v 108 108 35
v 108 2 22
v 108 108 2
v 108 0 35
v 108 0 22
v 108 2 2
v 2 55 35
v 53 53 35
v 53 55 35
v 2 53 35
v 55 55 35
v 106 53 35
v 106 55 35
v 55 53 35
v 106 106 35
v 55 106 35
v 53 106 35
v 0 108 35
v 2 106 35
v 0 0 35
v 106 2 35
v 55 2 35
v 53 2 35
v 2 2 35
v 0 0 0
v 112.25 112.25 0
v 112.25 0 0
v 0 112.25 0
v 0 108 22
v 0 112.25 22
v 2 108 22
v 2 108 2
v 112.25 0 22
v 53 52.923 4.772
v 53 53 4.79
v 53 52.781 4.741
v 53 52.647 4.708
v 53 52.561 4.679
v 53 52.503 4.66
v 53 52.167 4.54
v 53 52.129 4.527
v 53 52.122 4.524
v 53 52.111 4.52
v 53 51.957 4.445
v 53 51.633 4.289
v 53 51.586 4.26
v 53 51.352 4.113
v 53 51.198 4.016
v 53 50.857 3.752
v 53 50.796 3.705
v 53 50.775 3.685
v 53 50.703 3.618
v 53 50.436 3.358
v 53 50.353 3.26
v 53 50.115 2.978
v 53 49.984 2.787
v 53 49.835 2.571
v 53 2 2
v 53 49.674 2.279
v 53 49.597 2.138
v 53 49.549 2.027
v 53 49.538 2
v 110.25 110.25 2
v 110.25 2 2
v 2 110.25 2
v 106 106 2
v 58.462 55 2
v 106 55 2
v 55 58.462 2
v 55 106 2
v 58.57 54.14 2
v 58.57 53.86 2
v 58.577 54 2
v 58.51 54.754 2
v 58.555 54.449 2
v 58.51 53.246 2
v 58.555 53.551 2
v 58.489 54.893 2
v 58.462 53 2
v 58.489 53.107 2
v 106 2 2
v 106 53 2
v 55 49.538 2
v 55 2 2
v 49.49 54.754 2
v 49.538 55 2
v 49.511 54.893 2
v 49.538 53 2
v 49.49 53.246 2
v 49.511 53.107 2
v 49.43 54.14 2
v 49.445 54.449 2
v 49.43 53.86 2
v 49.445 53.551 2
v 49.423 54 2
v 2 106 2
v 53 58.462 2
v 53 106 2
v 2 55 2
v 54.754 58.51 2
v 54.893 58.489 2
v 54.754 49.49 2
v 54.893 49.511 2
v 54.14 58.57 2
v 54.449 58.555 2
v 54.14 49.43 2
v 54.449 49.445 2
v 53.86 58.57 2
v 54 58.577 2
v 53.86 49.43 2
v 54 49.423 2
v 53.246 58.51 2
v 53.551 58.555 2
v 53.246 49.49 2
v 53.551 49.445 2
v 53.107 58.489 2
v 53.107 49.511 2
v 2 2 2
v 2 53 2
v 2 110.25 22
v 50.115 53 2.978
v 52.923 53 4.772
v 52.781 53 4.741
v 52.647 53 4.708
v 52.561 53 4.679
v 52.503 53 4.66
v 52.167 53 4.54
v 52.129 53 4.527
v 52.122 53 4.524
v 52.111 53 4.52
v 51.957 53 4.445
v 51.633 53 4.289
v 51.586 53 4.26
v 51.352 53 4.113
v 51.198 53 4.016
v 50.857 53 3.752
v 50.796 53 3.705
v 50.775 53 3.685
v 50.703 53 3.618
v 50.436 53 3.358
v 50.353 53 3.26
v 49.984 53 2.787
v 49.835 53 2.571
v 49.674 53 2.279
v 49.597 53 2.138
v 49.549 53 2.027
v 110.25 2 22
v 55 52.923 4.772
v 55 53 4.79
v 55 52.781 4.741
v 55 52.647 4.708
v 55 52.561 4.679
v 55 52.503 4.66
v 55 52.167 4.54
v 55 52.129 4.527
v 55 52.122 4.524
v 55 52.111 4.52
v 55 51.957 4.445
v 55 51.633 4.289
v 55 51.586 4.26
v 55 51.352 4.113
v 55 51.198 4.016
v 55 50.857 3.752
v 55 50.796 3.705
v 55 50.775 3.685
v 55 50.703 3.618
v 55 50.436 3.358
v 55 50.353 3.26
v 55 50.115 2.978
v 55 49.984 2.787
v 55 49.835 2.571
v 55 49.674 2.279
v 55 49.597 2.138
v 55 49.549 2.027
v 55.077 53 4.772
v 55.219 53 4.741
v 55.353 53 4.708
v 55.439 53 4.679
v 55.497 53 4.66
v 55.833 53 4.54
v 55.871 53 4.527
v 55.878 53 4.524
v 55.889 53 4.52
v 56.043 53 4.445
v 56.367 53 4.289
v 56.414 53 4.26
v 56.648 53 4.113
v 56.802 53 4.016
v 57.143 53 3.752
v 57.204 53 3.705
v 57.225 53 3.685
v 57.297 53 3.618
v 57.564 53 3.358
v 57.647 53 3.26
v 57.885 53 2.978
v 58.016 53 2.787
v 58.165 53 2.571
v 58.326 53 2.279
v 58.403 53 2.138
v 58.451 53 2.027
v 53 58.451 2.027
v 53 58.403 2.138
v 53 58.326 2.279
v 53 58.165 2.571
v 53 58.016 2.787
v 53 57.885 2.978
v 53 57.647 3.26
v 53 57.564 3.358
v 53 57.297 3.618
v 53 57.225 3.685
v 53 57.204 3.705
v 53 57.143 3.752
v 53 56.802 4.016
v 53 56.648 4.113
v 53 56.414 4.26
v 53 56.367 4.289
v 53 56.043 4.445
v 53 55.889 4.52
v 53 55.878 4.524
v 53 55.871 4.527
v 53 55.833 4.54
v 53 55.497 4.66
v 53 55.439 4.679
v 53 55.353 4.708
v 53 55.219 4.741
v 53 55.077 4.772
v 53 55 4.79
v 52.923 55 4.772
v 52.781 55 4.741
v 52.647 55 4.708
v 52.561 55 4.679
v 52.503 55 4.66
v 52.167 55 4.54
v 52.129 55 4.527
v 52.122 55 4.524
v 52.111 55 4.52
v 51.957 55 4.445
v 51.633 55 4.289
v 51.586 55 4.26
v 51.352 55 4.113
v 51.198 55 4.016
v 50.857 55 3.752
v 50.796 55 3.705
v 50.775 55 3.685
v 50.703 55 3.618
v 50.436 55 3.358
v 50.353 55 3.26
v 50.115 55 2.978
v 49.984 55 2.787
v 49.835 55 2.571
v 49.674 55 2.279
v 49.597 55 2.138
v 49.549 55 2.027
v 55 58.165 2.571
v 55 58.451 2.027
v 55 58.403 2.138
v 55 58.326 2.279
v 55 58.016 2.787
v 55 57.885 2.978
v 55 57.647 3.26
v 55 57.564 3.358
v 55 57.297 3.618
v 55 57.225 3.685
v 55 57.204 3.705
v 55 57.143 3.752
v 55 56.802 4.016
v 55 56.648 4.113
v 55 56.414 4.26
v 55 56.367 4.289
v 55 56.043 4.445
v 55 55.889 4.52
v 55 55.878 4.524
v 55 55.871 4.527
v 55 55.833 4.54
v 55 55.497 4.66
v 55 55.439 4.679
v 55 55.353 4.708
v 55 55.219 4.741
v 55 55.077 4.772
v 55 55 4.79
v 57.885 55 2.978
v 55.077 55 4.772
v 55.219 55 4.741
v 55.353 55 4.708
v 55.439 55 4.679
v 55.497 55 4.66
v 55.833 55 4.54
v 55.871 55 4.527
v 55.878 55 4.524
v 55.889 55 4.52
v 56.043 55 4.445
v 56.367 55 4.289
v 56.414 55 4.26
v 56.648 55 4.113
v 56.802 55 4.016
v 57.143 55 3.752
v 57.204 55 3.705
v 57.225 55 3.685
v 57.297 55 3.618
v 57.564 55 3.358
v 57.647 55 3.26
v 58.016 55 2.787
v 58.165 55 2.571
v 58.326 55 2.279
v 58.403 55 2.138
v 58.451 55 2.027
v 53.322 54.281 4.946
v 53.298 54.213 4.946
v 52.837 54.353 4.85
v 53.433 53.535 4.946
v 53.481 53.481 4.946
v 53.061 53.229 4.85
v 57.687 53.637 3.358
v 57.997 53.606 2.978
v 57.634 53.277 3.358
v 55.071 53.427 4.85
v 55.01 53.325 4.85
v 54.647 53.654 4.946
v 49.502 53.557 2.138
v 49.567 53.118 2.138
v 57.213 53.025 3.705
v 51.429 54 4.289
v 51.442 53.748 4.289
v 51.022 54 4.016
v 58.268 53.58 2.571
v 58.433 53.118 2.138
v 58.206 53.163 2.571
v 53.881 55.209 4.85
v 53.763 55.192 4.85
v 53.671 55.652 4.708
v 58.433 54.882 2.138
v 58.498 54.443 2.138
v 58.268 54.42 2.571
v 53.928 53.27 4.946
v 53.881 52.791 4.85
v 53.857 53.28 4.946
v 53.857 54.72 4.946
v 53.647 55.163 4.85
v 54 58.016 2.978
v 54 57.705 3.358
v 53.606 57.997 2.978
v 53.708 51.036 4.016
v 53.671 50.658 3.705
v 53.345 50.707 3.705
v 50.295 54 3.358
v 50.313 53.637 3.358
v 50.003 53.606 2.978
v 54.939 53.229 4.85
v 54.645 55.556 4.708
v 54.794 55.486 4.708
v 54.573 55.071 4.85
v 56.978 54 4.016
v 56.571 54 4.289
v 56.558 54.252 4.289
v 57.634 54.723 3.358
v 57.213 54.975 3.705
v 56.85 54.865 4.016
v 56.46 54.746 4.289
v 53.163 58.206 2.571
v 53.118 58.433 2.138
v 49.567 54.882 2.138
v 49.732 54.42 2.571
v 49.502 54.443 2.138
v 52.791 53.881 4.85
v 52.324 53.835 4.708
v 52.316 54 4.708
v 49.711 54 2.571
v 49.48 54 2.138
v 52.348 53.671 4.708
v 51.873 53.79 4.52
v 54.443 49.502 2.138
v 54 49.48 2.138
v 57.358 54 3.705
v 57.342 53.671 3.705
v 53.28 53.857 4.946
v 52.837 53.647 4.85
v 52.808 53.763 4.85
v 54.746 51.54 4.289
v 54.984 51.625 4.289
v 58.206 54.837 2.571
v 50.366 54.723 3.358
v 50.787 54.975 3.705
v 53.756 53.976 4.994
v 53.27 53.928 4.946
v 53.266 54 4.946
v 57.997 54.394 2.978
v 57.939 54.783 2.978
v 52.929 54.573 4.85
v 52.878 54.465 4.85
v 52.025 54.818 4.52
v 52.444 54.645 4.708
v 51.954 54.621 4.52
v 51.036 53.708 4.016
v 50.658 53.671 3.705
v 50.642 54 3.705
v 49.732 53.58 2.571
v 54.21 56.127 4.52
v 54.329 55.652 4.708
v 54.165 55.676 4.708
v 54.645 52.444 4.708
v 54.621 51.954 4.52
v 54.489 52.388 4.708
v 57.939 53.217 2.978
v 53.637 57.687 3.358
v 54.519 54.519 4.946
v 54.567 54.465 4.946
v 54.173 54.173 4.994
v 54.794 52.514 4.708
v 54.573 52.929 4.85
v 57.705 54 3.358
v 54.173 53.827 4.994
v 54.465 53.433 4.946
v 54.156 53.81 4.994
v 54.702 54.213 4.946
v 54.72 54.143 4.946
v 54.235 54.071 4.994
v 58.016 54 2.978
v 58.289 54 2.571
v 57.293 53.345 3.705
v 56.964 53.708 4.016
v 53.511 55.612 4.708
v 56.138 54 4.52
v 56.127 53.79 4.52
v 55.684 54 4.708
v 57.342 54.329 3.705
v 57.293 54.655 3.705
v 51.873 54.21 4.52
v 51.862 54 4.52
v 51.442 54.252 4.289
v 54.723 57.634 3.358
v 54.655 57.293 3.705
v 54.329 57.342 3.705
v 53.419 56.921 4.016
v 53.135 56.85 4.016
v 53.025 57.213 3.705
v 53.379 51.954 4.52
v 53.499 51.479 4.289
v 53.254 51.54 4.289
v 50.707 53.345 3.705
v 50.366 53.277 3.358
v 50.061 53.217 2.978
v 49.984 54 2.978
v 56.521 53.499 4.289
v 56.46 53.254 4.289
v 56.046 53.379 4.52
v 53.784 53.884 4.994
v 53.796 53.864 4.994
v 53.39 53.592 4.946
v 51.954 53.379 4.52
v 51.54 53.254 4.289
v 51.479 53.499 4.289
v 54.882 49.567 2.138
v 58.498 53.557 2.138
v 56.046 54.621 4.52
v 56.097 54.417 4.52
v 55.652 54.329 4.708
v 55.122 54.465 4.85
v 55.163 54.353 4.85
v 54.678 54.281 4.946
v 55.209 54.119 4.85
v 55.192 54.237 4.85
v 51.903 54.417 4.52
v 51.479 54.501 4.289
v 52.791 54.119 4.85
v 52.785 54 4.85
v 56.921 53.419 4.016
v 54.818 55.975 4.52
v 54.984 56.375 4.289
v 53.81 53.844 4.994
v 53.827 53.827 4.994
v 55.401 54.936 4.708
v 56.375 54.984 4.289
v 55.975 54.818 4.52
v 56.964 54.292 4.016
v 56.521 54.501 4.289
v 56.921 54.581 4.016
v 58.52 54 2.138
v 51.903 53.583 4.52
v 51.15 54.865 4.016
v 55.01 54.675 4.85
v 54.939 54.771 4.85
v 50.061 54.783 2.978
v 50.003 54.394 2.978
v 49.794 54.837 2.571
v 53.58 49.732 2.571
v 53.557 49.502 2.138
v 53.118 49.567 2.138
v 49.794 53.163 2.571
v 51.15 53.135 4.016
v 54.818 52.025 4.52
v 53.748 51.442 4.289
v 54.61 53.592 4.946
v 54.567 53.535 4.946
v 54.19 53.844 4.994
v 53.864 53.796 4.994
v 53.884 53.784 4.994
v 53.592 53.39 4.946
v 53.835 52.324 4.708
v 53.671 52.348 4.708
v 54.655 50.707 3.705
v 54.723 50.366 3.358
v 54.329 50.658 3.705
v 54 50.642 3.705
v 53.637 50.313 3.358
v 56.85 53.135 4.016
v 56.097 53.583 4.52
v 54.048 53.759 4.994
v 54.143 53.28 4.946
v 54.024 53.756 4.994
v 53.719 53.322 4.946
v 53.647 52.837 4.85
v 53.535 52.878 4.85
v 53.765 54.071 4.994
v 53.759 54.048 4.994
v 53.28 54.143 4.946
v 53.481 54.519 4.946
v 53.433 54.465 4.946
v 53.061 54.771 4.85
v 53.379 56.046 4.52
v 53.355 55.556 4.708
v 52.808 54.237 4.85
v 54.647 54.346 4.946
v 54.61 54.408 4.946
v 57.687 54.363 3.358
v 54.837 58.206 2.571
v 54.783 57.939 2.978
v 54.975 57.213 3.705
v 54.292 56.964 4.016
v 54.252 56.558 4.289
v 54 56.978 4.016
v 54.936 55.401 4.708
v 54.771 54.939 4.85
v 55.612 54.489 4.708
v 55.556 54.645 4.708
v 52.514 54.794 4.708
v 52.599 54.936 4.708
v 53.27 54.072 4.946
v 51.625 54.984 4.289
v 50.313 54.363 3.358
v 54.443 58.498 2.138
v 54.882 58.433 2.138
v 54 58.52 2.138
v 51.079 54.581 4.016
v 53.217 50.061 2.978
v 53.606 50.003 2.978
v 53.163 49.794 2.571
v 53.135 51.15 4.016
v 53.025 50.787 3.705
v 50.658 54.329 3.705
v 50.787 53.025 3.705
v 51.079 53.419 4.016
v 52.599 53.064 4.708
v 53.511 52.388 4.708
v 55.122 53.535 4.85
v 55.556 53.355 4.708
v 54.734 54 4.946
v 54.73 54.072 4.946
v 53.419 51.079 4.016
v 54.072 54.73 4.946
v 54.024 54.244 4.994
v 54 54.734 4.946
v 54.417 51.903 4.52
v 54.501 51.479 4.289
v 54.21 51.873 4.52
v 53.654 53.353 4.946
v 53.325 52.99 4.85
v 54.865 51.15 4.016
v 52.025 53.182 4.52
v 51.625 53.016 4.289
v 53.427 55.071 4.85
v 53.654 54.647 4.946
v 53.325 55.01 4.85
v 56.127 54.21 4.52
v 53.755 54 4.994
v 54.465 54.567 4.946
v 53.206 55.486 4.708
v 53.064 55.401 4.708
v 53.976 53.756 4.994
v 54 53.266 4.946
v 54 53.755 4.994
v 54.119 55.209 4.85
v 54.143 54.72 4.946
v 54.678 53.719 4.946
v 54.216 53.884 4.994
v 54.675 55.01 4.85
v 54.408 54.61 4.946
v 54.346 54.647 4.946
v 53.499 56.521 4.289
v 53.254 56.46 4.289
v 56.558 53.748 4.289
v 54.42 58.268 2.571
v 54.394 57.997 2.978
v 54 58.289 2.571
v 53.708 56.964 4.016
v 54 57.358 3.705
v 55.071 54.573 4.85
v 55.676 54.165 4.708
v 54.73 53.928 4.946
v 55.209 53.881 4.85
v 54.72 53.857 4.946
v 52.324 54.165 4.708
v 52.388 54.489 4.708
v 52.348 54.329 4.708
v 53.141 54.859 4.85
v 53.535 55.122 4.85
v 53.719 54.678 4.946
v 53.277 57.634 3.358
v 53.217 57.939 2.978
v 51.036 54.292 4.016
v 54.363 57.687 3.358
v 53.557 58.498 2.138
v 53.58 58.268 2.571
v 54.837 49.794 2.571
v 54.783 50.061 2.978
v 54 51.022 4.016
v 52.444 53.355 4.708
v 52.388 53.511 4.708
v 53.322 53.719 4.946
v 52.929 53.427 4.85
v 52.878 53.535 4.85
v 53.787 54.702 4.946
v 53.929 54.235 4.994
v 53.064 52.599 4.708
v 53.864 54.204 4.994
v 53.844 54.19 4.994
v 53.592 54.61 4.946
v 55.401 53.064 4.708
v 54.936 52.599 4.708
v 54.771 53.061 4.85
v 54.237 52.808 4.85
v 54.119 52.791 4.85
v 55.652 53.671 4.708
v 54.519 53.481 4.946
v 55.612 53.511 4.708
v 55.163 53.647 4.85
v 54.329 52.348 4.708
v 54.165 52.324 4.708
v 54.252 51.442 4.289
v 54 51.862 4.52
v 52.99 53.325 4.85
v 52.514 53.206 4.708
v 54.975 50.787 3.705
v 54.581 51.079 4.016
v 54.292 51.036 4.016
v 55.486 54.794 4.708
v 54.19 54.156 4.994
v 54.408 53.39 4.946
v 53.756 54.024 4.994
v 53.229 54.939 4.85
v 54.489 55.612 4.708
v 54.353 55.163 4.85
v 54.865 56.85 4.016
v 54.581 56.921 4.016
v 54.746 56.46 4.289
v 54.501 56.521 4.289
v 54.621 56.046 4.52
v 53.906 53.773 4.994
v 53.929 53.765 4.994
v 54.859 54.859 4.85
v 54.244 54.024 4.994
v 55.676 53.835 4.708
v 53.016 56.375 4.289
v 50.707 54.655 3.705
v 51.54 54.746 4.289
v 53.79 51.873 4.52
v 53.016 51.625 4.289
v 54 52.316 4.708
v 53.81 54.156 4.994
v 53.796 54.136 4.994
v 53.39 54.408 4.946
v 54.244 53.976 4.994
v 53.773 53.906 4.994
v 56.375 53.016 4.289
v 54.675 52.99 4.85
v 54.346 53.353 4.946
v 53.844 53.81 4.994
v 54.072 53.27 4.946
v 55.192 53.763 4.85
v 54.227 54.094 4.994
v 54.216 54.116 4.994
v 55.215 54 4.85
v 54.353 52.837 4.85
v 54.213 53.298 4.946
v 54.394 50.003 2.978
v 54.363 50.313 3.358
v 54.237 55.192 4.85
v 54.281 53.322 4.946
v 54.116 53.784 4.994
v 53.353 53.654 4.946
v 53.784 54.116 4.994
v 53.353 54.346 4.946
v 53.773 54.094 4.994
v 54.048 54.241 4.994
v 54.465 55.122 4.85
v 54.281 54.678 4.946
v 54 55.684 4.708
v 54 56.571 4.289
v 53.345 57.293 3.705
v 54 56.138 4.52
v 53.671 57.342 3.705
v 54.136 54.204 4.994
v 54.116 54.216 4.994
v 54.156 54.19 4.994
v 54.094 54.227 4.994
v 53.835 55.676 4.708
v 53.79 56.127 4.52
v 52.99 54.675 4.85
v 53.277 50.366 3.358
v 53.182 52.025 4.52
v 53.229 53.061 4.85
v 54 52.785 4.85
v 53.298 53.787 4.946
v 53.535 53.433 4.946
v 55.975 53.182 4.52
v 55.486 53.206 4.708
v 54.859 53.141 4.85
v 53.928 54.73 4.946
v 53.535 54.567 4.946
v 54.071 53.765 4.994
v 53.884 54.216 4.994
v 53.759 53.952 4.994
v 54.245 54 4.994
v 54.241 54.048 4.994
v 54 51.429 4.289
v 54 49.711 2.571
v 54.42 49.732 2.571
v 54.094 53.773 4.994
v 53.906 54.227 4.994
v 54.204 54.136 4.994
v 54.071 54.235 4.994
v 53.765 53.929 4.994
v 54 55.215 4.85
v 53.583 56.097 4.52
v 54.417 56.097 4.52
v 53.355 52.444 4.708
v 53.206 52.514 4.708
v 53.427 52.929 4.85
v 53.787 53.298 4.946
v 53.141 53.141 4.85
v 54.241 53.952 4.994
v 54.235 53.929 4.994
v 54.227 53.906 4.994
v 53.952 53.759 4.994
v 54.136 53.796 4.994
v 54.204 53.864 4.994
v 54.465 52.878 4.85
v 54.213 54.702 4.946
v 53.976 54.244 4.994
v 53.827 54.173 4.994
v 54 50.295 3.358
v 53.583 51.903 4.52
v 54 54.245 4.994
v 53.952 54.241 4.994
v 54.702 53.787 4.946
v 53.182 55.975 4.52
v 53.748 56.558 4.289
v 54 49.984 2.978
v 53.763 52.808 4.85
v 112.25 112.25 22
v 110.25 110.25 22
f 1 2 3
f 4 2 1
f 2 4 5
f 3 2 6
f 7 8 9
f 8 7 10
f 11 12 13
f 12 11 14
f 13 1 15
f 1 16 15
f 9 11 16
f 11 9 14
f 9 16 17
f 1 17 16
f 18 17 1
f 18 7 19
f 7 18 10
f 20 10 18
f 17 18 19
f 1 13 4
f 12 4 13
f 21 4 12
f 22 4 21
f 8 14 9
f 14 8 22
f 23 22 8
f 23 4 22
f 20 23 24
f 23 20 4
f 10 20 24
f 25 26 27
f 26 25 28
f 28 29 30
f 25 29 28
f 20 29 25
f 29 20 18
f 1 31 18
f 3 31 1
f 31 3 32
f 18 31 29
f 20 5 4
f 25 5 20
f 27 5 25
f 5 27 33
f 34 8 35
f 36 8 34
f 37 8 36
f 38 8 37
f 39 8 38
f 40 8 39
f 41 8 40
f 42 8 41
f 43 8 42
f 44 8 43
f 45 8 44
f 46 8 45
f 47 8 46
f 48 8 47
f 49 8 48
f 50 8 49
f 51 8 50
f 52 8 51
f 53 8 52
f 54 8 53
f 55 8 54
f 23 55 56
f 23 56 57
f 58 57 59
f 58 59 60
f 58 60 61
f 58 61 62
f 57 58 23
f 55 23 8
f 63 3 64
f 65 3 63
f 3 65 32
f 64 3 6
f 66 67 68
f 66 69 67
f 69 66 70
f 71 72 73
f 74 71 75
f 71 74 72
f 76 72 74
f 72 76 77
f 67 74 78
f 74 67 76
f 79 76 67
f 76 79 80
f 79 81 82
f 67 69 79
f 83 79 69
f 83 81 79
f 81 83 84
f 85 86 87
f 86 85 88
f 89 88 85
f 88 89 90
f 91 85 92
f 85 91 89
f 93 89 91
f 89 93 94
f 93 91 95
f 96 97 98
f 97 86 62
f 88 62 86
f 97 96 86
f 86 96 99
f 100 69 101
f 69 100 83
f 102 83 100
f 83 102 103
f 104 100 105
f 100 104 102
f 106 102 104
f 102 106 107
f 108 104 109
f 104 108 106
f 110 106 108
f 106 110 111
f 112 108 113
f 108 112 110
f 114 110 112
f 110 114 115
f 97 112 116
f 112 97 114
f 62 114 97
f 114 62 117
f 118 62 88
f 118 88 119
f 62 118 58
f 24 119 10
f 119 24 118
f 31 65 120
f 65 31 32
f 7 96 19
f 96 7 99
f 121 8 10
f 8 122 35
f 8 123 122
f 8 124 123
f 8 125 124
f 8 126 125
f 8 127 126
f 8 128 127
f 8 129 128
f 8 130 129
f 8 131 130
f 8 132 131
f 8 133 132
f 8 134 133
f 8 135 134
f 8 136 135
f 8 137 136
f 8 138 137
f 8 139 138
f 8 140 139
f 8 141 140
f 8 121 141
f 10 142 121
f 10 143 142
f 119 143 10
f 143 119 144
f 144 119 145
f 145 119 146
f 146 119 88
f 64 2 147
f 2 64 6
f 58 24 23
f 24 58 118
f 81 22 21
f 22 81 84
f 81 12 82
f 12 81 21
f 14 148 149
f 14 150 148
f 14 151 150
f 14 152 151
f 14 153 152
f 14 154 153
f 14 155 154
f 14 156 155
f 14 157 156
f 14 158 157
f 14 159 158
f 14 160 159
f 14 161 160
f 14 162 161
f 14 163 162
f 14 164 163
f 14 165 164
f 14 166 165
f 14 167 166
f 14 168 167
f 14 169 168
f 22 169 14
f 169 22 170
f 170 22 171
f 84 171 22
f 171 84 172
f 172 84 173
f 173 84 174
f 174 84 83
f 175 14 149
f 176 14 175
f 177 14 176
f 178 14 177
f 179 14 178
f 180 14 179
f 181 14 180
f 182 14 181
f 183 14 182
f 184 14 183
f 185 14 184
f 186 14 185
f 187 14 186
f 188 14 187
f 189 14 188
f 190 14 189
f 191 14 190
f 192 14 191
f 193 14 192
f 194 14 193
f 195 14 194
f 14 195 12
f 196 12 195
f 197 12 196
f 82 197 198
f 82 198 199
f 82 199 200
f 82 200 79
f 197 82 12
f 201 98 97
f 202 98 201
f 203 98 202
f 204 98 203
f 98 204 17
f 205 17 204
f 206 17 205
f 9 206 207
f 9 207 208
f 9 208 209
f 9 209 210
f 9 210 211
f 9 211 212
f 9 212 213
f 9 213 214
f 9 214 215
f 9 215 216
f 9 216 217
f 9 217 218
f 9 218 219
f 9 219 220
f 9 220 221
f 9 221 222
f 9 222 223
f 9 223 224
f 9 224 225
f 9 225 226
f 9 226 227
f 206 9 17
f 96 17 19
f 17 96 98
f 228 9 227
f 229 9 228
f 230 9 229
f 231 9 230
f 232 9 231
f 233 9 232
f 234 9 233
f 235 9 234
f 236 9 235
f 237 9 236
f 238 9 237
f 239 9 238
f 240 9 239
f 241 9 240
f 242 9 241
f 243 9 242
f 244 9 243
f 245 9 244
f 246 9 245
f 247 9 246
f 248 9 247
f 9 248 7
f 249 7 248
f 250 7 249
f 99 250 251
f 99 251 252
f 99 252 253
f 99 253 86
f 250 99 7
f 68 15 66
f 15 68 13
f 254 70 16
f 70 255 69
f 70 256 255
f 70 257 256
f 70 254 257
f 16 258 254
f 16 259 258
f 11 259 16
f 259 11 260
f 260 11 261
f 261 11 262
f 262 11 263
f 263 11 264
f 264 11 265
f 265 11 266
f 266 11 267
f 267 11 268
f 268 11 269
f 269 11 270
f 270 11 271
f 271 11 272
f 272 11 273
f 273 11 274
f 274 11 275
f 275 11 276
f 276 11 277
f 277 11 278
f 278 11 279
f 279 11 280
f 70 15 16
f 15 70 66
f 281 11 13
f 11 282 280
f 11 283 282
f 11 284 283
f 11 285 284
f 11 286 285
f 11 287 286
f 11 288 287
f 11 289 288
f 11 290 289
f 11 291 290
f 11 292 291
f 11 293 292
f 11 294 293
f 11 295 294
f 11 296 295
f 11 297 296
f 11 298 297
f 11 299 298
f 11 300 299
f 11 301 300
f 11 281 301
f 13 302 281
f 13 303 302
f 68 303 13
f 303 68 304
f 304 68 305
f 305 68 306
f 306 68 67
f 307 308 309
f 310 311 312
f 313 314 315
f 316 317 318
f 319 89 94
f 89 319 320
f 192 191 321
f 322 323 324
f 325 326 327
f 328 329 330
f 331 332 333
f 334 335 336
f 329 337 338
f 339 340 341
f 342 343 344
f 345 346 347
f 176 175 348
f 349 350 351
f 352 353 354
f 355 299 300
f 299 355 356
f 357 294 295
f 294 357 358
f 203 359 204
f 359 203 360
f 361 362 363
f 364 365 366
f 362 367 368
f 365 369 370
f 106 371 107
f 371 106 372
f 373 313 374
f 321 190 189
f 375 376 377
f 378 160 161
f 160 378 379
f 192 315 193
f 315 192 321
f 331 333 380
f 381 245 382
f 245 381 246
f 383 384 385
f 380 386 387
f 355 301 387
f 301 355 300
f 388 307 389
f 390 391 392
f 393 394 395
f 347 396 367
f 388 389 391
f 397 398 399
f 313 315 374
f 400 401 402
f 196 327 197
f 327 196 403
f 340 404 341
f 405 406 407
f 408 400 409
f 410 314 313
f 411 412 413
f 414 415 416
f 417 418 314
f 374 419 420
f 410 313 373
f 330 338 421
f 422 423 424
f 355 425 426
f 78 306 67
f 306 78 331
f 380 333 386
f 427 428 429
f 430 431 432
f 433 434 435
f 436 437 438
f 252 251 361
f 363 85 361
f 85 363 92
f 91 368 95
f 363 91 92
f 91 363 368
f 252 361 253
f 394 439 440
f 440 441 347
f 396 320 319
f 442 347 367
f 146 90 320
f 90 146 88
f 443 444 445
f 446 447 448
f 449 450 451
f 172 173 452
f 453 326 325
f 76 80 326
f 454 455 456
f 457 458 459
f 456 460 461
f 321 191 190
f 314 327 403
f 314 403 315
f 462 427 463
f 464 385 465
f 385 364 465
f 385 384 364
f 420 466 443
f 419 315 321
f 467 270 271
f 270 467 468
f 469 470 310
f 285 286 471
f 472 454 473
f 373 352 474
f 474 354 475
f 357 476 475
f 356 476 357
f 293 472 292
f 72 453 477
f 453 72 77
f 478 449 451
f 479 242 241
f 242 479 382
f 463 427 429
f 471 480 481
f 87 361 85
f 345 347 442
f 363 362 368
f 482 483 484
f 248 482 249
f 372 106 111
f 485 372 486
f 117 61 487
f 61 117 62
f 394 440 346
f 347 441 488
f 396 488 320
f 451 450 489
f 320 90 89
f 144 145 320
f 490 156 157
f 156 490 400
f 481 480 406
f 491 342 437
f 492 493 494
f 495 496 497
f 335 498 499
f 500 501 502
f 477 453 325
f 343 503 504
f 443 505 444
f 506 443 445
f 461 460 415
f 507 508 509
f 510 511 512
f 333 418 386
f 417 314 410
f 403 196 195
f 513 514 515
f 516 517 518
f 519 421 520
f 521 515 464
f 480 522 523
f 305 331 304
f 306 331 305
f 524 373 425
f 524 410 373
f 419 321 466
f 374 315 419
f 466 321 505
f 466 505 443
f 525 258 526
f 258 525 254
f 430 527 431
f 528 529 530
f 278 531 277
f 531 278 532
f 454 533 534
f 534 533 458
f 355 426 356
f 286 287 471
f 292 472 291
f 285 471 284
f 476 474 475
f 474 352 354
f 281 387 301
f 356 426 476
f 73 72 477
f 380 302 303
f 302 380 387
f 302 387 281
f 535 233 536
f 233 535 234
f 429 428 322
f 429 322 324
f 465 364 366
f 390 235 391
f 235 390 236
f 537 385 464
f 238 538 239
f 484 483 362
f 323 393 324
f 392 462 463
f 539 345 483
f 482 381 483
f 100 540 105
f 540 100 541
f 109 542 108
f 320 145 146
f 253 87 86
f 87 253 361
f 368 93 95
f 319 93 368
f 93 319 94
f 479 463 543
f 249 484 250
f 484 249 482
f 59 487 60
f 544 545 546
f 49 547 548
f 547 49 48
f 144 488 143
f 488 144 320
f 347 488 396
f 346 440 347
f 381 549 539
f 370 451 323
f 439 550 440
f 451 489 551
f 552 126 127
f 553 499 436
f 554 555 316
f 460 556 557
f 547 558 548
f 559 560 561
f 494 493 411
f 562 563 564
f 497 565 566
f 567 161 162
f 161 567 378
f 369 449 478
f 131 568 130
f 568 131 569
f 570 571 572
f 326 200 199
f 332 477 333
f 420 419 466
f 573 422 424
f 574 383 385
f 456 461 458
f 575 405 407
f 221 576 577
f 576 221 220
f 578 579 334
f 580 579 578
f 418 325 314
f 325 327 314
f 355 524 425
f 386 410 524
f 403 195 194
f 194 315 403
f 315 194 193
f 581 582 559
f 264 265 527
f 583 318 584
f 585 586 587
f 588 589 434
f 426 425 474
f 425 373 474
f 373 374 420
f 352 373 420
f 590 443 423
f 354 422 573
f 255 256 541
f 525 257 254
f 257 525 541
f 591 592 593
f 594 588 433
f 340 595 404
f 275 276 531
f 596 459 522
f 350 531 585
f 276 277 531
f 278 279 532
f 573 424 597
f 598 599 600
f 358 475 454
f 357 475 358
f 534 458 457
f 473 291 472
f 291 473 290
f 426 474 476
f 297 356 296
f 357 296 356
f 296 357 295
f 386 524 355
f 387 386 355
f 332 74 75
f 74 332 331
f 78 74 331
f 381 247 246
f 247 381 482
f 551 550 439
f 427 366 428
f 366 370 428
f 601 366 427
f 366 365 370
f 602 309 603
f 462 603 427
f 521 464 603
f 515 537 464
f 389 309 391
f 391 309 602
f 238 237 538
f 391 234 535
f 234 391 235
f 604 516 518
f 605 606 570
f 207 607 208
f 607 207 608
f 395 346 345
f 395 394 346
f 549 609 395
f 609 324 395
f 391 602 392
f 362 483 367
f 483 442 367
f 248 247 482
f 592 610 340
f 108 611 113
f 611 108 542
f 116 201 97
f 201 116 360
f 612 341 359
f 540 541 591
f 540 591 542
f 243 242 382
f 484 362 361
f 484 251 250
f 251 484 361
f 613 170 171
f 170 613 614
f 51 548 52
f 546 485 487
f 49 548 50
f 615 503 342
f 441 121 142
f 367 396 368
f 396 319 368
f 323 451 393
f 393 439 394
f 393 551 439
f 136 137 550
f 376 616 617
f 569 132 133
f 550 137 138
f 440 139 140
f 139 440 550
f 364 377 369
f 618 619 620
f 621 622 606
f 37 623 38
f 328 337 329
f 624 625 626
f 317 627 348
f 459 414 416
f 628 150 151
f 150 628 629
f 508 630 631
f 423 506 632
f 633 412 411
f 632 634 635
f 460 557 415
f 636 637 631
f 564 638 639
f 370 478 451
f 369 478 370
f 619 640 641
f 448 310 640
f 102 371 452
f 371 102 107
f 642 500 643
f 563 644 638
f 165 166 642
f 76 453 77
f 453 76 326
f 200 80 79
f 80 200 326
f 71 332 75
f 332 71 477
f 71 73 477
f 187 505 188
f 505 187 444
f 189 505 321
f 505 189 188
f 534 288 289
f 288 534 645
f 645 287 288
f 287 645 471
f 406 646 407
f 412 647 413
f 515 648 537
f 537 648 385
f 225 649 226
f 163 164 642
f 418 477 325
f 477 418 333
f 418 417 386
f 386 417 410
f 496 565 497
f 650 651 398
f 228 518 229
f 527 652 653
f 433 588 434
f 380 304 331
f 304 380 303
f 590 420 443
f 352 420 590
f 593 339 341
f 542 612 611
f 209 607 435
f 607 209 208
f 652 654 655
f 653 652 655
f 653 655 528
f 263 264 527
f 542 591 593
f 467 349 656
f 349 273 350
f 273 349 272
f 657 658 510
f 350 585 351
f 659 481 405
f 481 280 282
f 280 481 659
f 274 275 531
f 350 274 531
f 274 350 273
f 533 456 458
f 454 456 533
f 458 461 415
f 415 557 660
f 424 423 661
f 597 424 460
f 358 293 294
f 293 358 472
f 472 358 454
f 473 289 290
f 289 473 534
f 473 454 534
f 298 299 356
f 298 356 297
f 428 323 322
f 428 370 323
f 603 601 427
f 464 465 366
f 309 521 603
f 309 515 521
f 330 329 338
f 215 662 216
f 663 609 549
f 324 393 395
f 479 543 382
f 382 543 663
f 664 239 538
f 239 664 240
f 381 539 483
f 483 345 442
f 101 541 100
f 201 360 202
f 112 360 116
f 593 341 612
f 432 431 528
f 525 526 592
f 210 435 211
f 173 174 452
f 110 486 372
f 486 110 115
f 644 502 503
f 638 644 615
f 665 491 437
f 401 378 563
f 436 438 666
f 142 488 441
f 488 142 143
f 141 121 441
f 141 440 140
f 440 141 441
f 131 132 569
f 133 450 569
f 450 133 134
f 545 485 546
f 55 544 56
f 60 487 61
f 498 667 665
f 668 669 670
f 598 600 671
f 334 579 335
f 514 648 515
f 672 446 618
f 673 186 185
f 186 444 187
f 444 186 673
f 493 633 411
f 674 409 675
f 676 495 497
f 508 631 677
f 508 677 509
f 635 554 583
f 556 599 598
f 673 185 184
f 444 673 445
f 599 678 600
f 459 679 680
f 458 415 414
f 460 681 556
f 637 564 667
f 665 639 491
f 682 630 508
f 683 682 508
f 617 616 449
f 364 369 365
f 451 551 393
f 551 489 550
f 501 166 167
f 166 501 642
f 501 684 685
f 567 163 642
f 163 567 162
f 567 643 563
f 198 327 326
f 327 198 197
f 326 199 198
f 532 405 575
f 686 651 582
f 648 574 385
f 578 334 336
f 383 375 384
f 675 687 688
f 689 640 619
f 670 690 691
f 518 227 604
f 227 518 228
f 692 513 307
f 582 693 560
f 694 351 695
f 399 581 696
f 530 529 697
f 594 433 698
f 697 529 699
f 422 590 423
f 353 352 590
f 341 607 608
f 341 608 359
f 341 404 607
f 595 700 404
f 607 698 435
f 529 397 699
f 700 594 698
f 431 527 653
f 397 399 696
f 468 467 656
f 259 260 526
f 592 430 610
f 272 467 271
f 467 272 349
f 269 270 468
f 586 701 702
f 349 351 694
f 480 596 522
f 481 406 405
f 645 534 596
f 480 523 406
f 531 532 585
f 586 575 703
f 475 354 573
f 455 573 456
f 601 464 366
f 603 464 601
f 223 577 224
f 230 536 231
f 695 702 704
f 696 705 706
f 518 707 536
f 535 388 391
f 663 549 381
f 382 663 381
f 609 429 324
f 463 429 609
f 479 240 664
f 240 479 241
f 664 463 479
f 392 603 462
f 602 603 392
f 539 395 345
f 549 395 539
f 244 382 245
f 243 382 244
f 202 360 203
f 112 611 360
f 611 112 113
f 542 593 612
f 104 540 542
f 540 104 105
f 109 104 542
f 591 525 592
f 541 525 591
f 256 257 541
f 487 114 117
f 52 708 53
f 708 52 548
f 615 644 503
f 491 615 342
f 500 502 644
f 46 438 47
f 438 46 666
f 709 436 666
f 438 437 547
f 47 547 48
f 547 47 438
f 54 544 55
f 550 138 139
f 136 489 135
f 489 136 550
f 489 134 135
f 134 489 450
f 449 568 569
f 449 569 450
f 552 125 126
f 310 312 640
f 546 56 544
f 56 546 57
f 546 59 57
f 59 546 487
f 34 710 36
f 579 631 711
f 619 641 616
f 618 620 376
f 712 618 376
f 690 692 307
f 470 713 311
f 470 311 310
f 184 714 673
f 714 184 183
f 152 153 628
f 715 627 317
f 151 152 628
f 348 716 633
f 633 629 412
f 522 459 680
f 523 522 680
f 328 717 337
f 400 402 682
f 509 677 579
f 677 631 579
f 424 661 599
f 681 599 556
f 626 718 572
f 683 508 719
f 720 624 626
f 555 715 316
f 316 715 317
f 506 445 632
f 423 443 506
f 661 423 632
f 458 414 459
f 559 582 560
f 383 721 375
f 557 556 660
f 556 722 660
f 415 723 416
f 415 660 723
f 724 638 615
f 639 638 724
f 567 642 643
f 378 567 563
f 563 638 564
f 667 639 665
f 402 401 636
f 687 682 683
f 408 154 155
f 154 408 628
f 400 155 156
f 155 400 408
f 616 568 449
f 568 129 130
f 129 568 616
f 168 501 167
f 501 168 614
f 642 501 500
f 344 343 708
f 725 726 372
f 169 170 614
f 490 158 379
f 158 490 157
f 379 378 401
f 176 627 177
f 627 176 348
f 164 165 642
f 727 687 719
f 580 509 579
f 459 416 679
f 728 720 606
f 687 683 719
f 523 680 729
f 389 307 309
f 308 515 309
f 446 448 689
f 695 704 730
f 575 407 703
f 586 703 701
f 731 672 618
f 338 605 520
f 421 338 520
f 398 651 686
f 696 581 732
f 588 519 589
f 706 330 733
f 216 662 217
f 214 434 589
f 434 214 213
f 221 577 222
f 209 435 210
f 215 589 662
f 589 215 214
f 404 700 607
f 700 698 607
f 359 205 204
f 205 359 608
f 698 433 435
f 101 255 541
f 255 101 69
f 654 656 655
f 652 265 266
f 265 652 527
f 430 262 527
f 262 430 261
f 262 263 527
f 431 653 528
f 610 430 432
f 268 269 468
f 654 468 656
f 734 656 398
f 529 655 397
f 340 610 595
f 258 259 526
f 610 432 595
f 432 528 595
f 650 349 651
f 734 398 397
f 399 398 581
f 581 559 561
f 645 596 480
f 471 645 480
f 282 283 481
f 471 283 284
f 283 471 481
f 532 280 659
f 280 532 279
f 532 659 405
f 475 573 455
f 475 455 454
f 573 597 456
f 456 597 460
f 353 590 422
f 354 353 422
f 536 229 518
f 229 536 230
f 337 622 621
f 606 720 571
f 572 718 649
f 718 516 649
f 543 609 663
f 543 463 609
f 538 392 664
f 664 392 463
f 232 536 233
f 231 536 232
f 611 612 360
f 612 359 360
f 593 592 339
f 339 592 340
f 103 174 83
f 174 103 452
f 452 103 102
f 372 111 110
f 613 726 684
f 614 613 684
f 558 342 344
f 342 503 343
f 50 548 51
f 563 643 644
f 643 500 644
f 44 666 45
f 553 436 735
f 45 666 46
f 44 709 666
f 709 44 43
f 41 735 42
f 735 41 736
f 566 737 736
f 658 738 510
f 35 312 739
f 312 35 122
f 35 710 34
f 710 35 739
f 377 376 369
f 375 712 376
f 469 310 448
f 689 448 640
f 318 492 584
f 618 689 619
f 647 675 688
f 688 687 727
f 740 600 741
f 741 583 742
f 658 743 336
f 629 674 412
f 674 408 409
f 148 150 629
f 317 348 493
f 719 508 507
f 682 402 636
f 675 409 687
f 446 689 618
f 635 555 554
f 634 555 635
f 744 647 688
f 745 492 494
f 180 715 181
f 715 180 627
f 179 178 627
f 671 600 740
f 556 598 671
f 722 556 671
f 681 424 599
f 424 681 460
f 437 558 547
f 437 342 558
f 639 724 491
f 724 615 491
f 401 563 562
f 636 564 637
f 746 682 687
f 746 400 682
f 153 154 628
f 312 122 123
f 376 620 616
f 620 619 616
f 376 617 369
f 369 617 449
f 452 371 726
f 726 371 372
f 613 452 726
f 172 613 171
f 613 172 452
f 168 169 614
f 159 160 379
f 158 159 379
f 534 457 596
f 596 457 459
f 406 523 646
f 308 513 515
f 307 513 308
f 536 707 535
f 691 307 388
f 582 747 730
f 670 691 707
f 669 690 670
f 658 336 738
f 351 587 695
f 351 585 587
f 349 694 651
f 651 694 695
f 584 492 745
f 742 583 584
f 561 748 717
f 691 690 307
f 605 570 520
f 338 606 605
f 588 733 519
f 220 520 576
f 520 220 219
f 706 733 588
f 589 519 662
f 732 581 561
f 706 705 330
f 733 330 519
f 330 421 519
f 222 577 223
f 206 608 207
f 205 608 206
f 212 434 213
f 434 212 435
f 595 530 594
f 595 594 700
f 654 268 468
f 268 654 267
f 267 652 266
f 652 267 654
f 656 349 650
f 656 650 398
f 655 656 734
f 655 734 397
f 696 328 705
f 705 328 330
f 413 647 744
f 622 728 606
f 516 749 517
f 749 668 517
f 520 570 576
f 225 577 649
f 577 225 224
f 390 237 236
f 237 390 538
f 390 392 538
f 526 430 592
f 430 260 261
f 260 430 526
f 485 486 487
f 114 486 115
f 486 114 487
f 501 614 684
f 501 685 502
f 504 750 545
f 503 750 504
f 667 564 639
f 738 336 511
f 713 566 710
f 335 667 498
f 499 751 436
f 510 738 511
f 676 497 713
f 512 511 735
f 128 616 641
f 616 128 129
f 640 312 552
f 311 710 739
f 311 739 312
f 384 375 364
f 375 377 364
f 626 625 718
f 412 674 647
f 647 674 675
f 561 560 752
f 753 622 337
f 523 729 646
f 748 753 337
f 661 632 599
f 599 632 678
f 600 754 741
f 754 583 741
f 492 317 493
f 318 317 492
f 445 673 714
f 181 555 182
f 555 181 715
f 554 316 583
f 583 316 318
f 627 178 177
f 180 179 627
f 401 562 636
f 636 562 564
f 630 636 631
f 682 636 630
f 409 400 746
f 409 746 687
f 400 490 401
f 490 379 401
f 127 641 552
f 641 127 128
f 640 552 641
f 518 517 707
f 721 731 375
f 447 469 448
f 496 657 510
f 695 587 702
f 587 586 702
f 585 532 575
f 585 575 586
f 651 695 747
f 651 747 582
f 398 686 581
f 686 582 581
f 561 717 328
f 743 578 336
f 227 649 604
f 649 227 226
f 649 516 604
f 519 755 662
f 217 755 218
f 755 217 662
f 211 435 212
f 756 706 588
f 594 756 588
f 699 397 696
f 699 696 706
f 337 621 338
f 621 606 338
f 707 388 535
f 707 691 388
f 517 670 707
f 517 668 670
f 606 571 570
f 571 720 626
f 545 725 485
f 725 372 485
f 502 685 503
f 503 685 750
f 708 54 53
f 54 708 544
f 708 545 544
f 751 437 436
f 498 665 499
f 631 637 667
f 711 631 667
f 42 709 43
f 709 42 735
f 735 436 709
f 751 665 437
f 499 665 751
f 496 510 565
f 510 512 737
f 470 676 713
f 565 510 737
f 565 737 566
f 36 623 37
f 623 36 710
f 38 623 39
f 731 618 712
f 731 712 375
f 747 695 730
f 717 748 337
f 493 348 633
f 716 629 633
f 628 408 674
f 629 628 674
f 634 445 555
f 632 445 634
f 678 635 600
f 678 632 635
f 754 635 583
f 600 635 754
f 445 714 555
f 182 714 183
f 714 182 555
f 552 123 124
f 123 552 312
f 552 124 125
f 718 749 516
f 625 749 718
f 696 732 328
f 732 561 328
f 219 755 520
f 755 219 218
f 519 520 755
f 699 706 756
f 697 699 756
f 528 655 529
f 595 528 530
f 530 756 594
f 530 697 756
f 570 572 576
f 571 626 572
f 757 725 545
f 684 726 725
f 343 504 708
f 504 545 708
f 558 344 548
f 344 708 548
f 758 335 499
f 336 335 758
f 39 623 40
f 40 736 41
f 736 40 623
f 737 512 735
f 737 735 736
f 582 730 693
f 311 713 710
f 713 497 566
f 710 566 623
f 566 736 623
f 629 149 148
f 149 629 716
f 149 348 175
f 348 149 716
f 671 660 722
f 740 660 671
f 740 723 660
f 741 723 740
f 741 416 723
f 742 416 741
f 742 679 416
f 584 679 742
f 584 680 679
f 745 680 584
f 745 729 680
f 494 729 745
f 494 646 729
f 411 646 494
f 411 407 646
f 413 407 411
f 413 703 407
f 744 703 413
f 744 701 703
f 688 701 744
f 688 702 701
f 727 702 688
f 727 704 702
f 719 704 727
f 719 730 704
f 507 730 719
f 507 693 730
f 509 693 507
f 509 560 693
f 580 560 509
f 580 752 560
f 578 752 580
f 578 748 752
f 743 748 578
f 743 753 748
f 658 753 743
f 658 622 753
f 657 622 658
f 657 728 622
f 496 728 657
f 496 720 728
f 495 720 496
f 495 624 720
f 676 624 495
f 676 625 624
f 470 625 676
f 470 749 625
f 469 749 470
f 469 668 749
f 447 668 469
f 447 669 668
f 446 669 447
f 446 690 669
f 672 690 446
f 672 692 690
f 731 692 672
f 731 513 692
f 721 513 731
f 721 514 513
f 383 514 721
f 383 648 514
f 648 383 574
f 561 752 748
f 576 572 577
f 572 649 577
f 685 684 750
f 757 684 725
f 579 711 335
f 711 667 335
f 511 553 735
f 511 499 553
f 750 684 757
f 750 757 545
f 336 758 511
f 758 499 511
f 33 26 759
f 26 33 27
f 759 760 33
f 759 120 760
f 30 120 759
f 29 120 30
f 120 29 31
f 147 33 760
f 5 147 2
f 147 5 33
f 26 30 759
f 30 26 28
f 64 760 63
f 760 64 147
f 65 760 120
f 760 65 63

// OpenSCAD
life_token_r = 40/2;
character_token_r = 47/2;
vote_token_r = 25/2;
reminder_token_r = 25/2;
night_token_r = 12/2;
alignment_token_r = 15/2;

shroud_x = 20;
shroud_y = 36;
shroud_notch_y = 8.5;

info_tag_x = 47;
info_tag_y = 58;
info_tag_corner_r = 3.5;
info_tag_offset_x = info_tag_x-info_tag_corner_r*2;
info_tag_offset_y = info_tag_y-info_tag_corner_r*2;

token_z = 1.5;
$fn=64;

// This is a tool for cutting nice circles out of paper for gluing onto the printed tokens.
// Print both parts. Glue a section of craft knife blade to the flat portion of the outer ring.
// Position the thicker inner ring exactly over the centre of the circle you want to cut.
// Lower the outer ring over the inner ring. Firmly hold the inner ring in place as you rotate
// the outer ring around to make the cut.
// Tweak the cutter_gap variable until your outer ring fits snugly over the inner ring with
// minimum wiggle room.

// I've found that it's good to make the circle pieces slightly smaller than the tokens to
// protect the edges of the paper.
cutter_tweak = 0.25;
cutter_inner_z = 30;
cutter_inner_thickness = 5;
cutter_outer_z = 15;
cutter_outer_thickness = 2;
cutter_gap = 0.1; // You may need to change this number based on how much clearance you need.
cutter_blade_thickness = 0.4;
cutter_blade_flat_section_x = 10;
cutter_fn = 100;
cutter_blade_x = 4.8;

module cutter(cut_radius) {
    cutter_inner(cut_radius-cutter_tweak);
    translate([cut_radius*2+10,0,0]) cutter_outer(cut_radius-cutter_tweak);
}

module cutter_inner(cut_radius) {
    difference() {
        cylinder(r=cut_radius-cutter_blade_thickness/2-cutter_outer_thickness-cutter_gap, h=cutter_inner_z, $fn=cutter_fn);
        cylinder(r=cut_radius-cutter_blade_thickness/2-cutter_outer_thickness-cutter_gap-cutter_inner_thickness, h=cutter_inner_z, $fn=cutter_fn);
    }
}

module cutter_blade_groove() {
    wt = (cutter_blade_flat_section_x - cutter_blade_x)/2;
    translate([-wt/2-cutter_blade_x/2,cutter_blade_thickness,cutter_outer_z/2]) cube([wt,cutter_blade_thickness*2,cutter_outer_z], center=true);
    translate([wt/2+cutter_blade_x/2,cutter_blade_thickness,cutter_outer_z/2]) cube([wt,cutter_blade_thickness*2,cutter_outer_z], center=true);
}

module cutter_outer(cut_radius, blade_grooves=false) {
    difference() {
        hull() {
            cylinder(r=cut_radius-cutter_blade_thickness/2, h=cutter_outer_z, $fn=cutter_fn);
            for (i = [0:360/3:360]) {
                rotate([0,0,i]) translate([-cutter_blade_flat_section_x/2,cut_radius-cutter_blade_thickness/2-cutter_outer_thickness,0]) cube([cutter_blade_flat_section_x, cutter_outer_thickness, cutter_outer_z]);
            }
        }
        cylinder(r=cut_radius-cutter_blade_thickness/2-cutter_outer_thickness, h=cutter_outer_z, $fn=cutter_fn);
    }
    if (blade_grooves) {
        for (i = [0:360/3:360]) {
            rotate([0,0,i]) translate([0,cut_radius-cutter_blade_thickness/2,0]) cutter_blade_groove();
        }
    }
}

module token(radius) {
    cylinder(r=radius,h=token_z);
}

module life_token() {
    token(life_token_r);
}

module character_token() {
    token(character_token_r);
}

module vote_token() {
    token(vote_token_r);
}

module reminder_token() {
    token(reminder_token_r);
}

module alignment_token() {
    token(alignment_token_r);
}

module night_token() {
    token(night_token_r);
}

module info_tag() {
    hull() {
        cylinder(r=info_tag_corner_r, h = token_z);
        translate([info_tag_offset_x, info_tag_offset_y, 0]) cylinder(r=info_tag_corner_r, h = token_z);
        translate([0, info_tag_offset_y, 0]) cylinder(r=info_tag_corner_r, h = token_z);
        translate([info_tag_offset_x, 0, 0]) cylinder(r=info_tag_corner_r, h = token_z);
    }
}

module shroud() {
    difference() {
        cube([shroud_x, shroud_y, token_z*2]);
        translate([shroud_x/2,0,0]) scale([shroud_x/2,shroud_notch_y,1]) rotate([0,0,45]) cube([sqrt(2), sqrt(2), 100], center=true);
        translate([shroud_x/2,shroud_y/4,token_z]) character_token();
    }
}


// Bits box
// I originally started out with a design matching the bits boxes that come with the
// proper version of the game, with three square compartments large enough to hold
// the character tokens, and two smaller compartments at the end, all in one row.
// However this was too long to fit onto my print bed, so I went for a 2x2 arrangement
// of uniformly sized compartments.
// I added a hole cutout in the bottom of the bits box base to let air in. I found
// on earlier versions that it was hard to get the lid off due to the partial vacuum
// formed when lifting the lid.
bits_box_wt = 2; // Wall thickness
game_box_inside_x = 257;
bits_box_clearance_x = 5;
// bits_box_x = game_box_inside_x-bits_box_clearance_x;
bits_box_lid_clearance = 0.25;
bits_box_bits_clearance = 0.5; // How much space around the reminder tokens?
// Make the compartments big enough to store four stacks of reminder tokens.
bits_box_compartment_xy = reminder_token_r*4+bits_box_bits_clearance*2;
bits_box_x = 2*bits_box_compartment_xy+bits_box_wt*3;
bits_box_y = bits_box_x;
bits_box_z = 35;
bits_box_lid_z = 20;
bits_box_vent_hole_r = 5; // The lid seals onto the base too well. Needs a breather hole.

module bits_box_base_cutout() {
    cube([bits_box_compartment_xy, bits_box_compartment_xy, bits_box_z-bits_box_wt]);
    // translate([bits_box_compartment_xy/2, bits_box_compartment_xy/2,-bits_box_wt]) cylinder(r=bits_box_vent_hole_r, h = bits_box_wt);
}

module bits_box_base() {
    difference() {
        cube([bits_box_x, bits_box_y, bits_box_z]);
        translate([bits_box_wt,bits_box_wt,bits_box_wt]) bits_box_base_cutout();
        translate([bits_box_wt*2+bits_box_compartment_xy,bits_box_wt,bits_box_wt]) bits_box_base_cutout();
        translate([bits_box_wt,bits_box_wt*2+bits_box_compartment_xy,bits_box_wt]) bits_box_base_cutout();
        translate([bits_box_wt*2+bits_box_compartment_xy,bits_box_wt*2+bits_box_compartment_xy,bits_box_wt]) bits_box_base_cutout();
        translate([bits_box_x/2, bits_box_y/2, 0]) sphere(r=bits_box_vent_hole_r);
    }
}

module bits_box_lid() {
    difference() {
        cube([bits_box_x+bits_box_lid_clearance+2*bits_box_wt, bits_box_y+bits_box_lid_clearance+2*bits_box_wt, bits_box_lid_z+bits_box_wt]);
        translate([bits_box_wt,bits_box_wt,bits_box_wt]) cube([bits_box_x+bits_box_lid_clearance, bits_box_y+bits_box_lid_clearance, bits_box_z]);
    }
}

// This is a clip to hold the two halves of the grimoire box together. Dog clips
// work well enough, but for maximum structural strength the very tops of the side
// edges of the grimoire should be pinched together. The pinch point of normal dog
// clips is some distance from the base of their throat.

clip_z = 25;
clip_length = 50;
clip_wt = 3;
// When tightly squashed the edges of my grimoire, made from a pandemic legacy season 0 box,
// measure 6.05mm in total.
clip_gap = 6.0;

module clip() {
    difference () {
        cube([clip_wt*2+clip_gap, clip_length, clip_z]);
        translate([clip_wt,0,clip_wt]) cube([clip_gap, clip_length, clip_z]);
        translate([0,0,clip_z]) rotate([0,45,0]) cube([(clip_wt*2+clip_gap)/sqrt(2), clip_length, (clip_wt*2+clip_gap)/sqrt(2)]);
    }
}

// You can safely ignore these, they're for exporting everything to STL in bulk.
batch_export = false;
print_life_token = false;
print_character_token = false;
print_vote_token = false;
print_reminder_token = false;
print_alignment_token = false;
print_night_token = false;
print_info_tag = false;
print_shroud = false;
print_cutter_character_token = false;
print_cutter_life_token = false;
print_cutter_reminder_token = false;
print_cutter_night_token = false;
print_cutter_alignment_token = false;
print_bits_box_base = false;
print_bits_box_lid = false;
print_clip = false;

if (batch_export) {
    if (print_life_token) life_token();
    if (print_character_token) character_token();
    if (print_vote_token) vote_token();
    if (print_reminder_token) reminder_token();
    if (print_alignment_token) alignment_token();
    if (print_night_token) night_token();
    if (print_info_tag) info_tag();
    if (print_shroud) shroud();
    if (print_cutter_character_token) cutter(character_token_r);
    if (print_cutter_life_token) cutter(life_token_r);
    if (print_cutter_reminder_token) cutter(reminder_token_r);
    if (print_cutter_night_token) cutter(night_token_r);
    if (print_cutter_alignment_token) cutter(alignment_token_r);
    if (print_bits_box_base) bits_box_base();
    if (print_bits_box_lid) bits_box_lid();
    if (print_clip) rotate([90,0,0]) clip();
} else {
    render() {
        // life_token(); // 18 (townsfolk) + 5 (traveller)
        // character_token(); // 103
        // vote_token(); // 20
        // reminder_token(); // 125
        // alignment_token(); // 22
        // night_token(); // 34
        // info_tag(); // 12
        // shroud(); // 18
        // cutter(character_token_r);
        // cutter(life_token_r);
        // cutter(reminder_token_r);
        bits_box_base(); // 4
        bits_box_lid(); // 4
        // rotate([90,0,0]) clip();
    }
}
